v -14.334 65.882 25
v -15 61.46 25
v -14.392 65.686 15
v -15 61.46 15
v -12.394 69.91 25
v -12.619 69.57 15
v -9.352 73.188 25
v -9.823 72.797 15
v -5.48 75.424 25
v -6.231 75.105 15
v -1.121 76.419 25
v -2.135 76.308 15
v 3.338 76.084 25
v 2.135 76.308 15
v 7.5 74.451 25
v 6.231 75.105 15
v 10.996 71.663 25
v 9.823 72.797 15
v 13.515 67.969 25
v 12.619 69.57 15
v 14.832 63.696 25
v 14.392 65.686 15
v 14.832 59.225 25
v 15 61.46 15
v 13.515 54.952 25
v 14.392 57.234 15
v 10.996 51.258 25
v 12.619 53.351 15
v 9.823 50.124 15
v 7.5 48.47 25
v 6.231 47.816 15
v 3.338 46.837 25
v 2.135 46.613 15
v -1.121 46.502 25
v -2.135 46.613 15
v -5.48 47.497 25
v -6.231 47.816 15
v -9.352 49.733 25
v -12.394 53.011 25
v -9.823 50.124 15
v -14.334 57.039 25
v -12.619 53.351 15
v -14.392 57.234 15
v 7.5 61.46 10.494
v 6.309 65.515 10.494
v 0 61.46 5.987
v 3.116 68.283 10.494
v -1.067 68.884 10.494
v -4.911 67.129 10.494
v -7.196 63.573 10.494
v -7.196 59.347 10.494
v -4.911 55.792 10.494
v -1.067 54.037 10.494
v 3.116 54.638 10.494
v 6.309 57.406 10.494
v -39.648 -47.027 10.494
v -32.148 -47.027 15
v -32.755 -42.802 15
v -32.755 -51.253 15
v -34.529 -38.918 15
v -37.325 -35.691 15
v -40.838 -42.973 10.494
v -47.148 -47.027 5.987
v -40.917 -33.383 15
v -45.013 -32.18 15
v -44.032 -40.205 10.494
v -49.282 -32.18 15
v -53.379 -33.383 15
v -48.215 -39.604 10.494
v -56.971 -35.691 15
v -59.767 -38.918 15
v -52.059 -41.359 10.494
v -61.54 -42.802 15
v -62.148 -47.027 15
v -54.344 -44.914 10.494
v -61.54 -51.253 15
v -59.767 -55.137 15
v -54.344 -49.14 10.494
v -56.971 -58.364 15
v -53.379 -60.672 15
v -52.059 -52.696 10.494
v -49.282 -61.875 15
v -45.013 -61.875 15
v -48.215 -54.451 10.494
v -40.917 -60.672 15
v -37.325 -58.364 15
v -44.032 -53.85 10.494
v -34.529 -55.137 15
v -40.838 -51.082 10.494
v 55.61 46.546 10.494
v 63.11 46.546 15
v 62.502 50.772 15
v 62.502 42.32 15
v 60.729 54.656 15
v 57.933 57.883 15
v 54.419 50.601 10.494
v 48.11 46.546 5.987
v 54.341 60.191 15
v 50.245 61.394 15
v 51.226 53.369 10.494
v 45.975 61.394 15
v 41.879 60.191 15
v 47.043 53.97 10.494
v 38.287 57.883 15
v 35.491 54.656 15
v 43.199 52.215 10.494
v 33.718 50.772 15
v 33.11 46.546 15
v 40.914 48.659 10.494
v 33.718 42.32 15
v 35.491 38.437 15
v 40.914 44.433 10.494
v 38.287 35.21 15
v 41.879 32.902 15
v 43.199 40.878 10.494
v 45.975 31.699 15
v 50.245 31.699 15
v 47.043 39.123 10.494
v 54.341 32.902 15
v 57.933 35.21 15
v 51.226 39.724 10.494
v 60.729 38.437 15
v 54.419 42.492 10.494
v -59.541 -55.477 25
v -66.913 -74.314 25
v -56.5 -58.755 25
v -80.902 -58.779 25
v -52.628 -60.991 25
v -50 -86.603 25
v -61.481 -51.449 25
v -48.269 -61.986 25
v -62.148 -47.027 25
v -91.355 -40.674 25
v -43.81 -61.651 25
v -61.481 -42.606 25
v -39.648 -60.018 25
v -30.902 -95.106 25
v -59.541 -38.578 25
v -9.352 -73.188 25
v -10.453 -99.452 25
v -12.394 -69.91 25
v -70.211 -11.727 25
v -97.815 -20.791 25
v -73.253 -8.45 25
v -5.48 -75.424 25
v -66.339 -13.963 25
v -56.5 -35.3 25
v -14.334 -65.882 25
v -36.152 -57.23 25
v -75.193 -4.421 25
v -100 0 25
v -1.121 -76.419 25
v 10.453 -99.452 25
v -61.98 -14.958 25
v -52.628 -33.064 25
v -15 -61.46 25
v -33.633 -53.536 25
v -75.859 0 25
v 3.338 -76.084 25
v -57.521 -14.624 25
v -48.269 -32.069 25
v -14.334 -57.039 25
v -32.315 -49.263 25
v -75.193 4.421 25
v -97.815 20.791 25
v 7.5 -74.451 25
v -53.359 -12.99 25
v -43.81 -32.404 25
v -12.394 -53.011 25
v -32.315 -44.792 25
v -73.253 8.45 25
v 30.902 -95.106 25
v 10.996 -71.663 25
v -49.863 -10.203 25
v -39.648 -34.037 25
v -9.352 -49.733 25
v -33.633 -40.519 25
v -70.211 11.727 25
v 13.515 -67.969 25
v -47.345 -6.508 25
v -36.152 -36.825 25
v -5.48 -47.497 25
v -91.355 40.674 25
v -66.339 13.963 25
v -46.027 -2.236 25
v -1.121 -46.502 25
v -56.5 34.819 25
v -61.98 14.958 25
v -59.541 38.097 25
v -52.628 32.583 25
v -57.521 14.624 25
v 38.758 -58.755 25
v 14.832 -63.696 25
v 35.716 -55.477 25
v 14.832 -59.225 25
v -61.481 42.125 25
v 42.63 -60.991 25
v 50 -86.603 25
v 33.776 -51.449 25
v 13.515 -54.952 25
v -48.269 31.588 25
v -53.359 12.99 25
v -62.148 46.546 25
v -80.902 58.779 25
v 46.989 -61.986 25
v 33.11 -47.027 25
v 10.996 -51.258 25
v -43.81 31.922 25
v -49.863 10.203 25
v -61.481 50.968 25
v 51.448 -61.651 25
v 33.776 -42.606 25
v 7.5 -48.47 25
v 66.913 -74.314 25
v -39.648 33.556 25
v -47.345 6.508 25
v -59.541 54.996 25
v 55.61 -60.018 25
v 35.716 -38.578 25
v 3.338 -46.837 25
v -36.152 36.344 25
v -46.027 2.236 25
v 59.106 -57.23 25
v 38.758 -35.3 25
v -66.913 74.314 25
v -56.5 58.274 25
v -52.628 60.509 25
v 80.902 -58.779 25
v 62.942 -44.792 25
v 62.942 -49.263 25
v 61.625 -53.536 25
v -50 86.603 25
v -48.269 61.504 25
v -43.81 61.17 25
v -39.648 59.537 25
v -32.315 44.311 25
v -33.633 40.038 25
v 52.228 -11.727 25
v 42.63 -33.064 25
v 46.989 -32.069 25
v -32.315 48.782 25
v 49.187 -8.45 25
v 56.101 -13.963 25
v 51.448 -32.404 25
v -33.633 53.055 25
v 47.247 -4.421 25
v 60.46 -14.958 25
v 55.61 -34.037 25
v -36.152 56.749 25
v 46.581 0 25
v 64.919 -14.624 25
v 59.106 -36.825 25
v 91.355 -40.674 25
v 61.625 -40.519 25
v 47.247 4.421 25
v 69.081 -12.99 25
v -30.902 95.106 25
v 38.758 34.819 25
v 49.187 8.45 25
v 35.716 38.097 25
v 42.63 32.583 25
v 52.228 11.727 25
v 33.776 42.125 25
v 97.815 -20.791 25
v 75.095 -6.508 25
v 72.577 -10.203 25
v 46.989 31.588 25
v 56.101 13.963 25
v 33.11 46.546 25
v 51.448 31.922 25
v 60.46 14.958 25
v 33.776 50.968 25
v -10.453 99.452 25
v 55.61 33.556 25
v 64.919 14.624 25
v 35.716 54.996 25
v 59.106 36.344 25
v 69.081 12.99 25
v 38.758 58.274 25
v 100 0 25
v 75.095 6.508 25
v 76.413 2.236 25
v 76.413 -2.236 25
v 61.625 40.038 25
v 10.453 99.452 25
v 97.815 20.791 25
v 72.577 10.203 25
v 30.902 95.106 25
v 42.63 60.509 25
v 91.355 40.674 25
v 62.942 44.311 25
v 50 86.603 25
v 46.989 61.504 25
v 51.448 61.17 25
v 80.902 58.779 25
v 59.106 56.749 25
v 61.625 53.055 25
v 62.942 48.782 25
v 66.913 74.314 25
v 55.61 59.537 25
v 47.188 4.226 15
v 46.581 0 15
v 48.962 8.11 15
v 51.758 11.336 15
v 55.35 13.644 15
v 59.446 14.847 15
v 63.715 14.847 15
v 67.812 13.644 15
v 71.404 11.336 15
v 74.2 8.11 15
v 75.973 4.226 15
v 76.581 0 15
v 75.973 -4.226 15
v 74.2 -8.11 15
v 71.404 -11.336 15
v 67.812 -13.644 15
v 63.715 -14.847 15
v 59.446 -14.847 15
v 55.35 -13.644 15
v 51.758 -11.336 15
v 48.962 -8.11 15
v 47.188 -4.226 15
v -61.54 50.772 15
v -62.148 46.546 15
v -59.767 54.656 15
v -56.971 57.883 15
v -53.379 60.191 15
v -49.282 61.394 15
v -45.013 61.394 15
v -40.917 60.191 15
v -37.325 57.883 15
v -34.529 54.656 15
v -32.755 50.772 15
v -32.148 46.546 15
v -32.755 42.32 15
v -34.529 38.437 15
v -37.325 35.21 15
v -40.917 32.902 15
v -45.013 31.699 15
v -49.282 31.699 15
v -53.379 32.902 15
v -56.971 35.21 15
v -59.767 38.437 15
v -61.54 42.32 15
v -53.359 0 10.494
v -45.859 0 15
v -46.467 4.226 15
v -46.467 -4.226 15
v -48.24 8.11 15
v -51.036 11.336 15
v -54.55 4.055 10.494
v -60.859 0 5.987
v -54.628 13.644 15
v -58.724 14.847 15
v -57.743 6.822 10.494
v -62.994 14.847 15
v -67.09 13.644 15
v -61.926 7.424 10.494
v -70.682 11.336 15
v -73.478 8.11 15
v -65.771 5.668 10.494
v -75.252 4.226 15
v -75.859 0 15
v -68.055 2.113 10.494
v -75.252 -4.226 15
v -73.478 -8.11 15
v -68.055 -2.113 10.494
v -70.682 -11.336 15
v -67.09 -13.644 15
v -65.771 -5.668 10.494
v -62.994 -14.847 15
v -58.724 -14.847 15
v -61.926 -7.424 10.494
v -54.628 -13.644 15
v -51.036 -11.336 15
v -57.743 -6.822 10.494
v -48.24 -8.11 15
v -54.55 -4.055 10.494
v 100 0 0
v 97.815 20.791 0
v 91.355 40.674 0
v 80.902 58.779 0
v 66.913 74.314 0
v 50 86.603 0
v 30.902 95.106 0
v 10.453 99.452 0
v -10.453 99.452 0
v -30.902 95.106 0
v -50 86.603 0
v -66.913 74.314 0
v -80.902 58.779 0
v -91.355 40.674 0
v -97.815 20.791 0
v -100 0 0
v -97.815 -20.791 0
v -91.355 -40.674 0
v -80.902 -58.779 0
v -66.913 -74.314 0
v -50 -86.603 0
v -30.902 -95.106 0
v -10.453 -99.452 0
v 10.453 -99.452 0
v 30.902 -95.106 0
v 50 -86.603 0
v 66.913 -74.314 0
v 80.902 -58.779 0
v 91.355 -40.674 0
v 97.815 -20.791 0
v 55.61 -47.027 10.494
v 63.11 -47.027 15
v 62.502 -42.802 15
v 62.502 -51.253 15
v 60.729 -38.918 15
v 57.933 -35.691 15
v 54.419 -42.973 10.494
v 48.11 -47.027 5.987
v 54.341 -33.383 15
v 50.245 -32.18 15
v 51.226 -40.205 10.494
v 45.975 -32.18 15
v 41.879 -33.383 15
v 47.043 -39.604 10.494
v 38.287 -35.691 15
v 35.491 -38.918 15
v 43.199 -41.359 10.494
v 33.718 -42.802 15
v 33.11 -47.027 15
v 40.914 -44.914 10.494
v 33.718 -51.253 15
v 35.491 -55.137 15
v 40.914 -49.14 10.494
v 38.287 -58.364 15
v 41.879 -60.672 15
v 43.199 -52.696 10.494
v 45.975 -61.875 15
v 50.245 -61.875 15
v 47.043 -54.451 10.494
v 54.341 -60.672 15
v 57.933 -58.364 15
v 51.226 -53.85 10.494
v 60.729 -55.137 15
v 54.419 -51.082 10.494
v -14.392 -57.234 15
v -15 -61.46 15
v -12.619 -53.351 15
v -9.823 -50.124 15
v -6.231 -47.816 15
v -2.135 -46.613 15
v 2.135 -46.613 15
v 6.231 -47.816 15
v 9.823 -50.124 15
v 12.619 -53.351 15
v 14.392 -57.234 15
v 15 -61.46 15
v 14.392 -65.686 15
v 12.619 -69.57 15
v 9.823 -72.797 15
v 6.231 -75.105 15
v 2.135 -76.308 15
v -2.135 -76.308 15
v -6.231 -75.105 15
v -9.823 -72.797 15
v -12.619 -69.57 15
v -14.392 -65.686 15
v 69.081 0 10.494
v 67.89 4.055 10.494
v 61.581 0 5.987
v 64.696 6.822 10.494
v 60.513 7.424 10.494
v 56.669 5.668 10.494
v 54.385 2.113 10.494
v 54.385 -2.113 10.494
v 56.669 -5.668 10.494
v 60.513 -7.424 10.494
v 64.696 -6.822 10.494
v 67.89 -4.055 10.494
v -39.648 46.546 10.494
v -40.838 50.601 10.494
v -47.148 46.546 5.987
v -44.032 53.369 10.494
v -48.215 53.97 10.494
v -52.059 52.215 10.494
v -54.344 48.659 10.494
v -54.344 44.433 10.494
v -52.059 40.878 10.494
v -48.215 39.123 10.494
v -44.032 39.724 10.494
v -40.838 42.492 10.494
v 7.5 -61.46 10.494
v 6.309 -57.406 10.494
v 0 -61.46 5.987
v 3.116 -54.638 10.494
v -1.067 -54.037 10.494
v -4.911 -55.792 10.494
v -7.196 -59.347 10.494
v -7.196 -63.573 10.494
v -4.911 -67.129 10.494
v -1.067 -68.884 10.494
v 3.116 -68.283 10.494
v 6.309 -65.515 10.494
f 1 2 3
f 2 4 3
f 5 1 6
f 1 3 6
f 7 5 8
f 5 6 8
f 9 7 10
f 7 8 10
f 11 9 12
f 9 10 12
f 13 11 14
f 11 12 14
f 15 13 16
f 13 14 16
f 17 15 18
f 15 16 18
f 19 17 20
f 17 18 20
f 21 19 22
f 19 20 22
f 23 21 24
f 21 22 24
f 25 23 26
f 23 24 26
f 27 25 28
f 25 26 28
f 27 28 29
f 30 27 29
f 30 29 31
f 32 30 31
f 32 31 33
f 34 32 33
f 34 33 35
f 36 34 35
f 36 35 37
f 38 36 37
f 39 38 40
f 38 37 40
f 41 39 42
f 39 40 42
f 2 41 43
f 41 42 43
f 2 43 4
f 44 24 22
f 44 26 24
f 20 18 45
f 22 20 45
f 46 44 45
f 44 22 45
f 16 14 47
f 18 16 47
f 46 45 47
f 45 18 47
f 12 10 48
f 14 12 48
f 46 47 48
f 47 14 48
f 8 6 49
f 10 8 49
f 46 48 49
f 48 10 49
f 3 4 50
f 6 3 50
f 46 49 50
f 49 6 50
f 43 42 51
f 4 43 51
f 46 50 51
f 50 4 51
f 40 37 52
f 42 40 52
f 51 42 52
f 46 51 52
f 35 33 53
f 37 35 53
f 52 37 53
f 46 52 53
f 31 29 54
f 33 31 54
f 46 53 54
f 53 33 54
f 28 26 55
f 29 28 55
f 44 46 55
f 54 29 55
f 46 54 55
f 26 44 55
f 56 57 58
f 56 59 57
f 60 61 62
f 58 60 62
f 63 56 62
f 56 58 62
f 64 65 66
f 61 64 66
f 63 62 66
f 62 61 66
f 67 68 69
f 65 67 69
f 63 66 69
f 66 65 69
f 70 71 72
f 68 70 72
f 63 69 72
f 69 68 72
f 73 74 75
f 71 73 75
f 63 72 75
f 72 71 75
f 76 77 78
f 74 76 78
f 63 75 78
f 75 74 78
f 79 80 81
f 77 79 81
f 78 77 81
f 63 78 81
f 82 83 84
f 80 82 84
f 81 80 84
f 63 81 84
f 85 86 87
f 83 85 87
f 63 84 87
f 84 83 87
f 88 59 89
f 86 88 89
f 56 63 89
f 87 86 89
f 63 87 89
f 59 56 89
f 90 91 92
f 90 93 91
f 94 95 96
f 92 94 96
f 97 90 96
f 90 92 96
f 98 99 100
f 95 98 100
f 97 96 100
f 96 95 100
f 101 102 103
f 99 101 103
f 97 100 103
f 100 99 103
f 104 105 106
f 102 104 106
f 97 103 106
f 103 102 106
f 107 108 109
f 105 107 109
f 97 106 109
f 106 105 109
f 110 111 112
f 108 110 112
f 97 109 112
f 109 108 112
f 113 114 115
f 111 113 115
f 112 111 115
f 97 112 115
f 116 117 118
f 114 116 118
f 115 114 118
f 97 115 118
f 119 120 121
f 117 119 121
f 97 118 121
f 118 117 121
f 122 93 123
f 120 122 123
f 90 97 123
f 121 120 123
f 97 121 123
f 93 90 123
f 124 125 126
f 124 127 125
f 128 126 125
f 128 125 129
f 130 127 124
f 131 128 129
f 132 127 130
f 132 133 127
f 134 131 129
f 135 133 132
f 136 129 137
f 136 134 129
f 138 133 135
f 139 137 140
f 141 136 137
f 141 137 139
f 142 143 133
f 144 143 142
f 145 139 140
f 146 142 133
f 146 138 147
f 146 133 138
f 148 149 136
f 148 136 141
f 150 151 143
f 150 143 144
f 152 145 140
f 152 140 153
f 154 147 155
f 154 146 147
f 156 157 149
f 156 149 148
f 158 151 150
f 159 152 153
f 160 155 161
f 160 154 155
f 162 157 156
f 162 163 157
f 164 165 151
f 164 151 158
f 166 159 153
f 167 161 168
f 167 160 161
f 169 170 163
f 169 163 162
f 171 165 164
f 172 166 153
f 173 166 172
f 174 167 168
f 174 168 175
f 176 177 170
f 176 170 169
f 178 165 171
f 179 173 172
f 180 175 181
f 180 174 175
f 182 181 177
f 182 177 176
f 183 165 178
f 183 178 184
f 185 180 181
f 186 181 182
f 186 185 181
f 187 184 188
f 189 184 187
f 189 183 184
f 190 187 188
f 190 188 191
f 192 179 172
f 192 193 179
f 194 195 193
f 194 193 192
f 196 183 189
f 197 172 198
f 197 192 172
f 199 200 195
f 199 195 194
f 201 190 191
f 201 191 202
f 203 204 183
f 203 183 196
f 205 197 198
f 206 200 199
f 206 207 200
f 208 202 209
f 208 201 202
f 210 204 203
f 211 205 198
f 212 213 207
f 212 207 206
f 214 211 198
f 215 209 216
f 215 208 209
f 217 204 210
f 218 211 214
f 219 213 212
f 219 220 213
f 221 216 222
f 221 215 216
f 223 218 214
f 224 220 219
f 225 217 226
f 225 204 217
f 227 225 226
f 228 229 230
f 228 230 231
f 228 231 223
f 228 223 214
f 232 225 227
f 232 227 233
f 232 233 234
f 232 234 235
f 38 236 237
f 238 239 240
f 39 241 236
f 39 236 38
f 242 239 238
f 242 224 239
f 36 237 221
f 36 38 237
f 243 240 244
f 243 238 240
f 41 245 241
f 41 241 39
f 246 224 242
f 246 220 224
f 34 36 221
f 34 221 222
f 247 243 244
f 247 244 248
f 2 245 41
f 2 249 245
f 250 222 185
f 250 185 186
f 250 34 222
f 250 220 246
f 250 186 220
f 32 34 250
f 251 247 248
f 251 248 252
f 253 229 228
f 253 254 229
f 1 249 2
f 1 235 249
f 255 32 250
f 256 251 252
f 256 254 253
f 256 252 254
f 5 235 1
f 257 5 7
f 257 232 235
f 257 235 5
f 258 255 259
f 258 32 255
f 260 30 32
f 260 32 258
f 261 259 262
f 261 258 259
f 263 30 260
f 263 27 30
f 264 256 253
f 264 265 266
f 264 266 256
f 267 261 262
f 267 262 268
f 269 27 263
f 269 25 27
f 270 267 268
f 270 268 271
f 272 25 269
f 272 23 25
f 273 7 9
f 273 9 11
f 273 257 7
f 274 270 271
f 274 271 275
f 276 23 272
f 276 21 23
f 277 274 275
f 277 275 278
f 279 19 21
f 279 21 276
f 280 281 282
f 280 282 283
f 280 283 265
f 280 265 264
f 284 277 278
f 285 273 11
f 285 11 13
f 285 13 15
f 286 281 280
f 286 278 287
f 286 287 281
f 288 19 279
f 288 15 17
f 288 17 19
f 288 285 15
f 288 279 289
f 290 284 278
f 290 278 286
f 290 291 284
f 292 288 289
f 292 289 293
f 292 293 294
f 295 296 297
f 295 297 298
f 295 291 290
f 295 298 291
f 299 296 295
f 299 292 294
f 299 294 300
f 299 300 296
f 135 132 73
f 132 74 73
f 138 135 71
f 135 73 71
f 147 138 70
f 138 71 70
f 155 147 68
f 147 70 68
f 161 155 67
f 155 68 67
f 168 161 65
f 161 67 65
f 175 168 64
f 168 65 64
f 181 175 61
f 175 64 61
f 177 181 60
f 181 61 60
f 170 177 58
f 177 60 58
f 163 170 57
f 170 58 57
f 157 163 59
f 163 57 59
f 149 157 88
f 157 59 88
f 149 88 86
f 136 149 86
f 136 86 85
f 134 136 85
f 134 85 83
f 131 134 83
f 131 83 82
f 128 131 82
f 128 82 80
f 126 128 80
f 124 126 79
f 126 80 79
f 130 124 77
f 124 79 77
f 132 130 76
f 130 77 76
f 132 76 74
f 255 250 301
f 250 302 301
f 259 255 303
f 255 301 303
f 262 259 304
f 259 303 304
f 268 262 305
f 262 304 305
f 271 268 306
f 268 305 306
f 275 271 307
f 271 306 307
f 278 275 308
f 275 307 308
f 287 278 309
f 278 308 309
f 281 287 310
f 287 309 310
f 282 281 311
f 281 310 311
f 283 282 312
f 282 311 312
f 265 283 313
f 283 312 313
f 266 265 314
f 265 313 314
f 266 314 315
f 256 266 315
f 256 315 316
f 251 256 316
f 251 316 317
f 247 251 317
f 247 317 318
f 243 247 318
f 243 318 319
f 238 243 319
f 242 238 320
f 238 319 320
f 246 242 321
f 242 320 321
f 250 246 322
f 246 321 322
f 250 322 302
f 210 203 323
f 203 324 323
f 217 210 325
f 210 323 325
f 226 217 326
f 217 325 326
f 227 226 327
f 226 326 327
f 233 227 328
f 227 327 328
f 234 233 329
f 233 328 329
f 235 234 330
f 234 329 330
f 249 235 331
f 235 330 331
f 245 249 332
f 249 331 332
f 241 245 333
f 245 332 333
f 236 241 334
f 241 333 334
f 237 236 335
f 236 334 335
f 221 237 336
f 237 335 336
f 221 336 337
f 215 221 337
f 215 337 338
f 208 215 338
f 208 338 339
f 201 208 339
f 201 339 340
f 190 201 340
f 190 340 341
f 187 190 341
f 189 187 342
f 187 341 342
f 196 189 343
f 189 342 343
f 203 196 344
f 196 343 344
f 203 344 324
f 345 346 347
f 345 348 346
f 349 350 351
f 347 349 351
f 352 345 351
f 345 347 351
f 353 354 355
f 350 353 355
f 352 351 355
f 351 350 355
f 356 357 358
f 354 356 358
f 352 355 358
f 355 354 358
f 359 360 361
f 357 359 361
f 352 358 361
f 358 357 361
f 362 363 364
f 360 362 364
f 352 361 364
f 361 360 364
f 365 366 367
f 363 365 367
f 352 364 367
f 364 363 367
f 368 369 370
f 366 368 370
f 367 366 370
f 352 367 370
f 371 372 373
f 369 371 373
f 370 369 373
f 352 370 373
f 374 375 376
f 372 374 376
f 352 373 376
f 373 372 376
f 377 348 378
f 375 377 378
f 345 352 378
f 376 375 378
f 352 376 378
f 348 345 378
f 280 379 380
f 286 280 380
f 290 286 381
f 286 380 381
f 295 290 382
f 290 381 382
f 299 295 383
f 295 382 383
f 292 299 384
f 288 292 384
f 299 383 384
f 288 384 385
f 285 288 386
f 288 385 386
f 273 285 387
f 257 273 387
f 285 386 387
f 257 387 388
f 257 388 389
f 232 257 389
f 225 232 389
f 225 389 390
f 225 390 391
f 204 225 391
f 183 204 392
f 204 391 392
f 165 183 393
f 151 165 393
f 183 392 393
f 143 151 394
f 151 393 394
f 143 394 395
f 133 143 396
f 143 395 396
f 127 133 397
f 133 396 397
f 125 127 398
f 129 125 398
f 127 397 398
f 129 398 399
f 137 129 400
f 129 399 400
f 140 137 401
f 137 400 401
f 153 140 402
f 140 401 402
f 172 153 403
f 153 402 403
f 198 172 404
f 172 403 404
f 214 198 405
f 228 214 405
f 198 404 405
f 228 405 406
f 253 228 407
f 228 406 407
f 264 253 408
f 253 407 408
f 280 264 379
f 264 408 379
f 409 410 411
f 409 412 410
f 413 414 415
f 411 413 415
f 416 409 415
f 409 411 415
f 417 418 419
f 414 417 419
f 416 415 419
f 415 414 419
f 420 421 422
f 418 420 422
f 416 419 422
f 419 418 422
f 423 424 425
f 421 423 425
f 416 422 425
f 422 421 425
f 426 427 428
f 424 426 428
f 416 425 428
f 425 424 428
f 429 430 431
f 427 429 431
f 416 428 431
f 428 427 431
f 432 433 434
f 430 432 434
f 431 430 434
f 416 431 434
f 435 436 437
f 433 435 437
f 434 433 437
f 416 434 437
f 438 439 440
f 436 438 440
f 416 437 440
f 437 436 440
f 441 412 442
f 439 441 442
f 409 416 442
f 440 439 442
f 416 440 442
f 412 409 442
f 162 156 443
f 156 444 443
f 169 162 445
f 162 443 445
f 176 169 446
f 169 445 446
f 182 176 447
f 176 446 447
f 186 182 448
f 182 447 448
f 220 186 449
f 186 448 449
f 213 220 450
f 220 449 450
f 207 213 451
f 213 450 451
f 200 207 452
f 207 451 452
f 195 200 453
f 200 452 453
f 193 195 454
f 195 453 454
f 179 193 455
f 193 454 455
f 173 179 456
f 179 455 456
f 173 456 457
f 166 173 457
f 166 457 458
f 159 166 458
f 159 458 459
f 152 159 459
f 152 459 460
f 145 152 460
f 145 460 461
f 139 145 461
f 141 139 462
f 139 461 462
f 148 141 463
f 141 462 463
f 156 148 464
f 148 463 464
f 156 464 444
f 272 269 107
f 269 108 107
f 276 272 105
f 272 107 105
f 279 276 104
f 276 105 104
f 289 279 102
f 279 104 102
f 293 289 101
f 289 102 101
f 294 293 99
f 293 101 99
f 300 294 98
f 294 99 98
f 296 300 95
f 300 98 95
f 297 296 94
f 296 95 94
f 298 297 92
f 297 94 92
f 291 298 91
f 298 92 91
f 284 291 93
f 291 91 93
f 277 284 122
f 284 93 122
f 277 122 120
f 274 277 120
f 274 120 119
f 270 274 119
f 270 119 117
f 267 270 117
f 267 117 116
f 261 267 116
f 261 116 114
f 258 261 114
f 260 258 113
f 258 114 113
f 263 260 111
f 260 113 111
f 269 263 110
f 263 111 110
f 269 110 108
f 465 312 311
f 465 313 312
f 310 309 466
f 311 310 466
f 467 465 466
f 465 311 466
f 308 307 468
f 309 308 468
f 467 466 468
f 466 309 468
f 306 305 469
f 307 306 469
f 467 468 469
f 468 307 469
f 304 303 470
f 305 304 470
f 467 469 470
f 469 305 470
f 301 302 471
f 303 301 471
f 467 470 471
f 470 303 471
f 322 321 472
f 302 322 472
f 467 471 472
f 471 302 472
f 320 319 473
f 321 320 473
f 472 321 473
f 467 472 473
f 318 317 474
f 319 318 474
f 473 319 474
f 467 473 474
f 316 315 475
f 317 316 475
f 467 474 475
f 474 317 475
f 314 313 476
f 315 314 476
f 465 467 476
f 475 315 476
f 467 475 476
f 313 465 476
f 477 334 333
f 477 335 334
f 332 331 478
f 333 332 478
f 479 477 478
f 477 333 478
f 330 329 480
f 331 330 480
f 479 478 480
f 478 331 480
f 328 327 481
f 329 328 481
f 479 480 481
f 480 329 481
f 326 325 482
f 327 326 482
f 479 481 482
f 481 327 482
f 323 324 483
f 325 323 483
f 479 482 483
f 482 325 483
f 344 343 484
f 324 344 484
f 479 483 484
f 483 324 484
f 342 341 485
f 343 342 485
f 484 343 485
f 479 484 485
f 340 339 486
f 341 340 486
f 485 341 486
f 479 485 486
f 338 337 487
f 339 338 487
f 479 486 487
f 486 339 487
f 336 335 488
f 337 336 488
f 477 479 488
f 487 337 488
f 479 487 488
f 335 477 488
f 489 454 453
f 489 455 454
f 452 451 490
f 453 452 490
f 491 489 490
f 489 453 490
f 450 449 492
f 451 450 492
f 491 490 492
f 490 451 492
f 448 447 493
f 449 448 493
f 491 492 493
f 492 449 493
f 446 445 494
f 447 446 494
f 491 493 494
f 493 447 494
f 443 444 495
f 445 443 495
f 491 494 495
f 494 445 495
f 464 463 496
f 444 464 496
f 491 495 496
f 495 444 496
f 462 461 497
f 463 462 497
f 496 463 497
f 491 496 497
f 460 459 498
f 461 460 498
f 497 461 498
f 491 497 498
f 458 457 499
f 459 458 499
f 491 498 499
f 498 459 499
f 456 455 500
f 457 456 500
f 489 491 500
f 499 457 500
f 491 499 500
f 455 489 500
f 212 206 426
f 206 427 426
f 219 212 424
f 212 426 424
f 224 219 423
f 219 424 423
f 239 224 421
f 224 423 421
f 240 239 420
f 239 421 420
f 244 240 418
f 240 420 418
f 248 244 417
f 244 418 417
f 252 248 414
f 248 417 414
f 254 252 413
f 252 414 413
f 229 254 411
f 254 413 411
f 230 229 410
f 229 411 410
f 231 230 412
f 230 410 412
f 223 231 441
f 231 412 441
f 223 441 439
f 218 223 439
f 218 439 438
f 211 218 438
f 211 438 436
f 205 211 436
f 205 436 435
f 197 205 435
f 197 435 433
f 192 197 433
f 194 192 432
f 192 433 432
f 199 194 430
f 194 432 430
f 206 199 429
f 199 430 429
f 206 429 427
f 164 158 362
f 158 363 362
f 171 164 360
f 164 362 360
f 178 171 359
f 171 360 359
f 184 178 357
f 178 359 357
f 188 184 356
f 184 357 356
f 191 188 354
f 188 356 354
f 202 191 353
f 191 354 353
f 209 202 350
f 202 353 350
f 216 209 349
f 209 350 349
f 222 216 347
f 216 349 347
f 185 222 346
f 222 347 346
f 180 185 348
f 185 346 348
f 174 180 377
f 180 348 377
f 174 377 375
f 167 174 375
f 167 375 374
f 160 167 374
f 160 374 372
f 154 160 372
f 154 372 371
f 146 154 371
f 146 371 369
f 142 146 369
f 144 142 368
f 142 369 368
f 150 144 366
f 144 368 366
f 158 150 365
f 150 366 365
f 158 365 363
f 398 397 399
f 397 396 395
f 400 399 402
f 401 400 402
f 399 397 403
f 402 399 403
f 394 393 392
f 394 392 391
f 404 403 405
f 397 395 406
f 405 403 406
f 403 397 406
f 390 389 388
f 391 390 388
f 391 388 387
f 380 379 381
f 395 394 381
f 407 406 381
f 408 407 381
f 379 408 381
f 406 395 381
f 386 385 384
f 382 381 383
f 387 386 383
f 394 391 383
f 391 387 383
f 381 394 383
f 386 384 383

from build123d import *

# Parameters (mm, degrees)
F0_R     = 100
F1_DEPTH = 25
F3_D     = 30
F3_DEPTH = 10
F3_TIP   = 9.0129092854


with BuildPart() as f1:
    # F0 (on Top) → F1 (new body)
    with BuildSketch(Plane.XY):
        Circle(F0_R)
    extrude(amount=F1_DEPTH)

    # F3
    with Locations(Plane.XY.offset(25)):
        with Locations((-47.1477657557, 46.5463921428), (-60.8591064811, 0), (-47.1477657557, -47.0274910331), (0, -61.4604838192), (48.1099672616, -47.0274910331), (61.5807585418, 0), (48.1099672616, 46.5463921428), (0, 61.4604838192)):
            Hole(F3_D / 2, depth=F3_DEPTH)
            with Locations((0, 0, -(F3_DEPTH + F3_TIP / 2))):  # 118° drill point
                Cone(0, F3_D / 2, F3_TIP, mode=Mode.SUBTRACT)


solid = f1.part
